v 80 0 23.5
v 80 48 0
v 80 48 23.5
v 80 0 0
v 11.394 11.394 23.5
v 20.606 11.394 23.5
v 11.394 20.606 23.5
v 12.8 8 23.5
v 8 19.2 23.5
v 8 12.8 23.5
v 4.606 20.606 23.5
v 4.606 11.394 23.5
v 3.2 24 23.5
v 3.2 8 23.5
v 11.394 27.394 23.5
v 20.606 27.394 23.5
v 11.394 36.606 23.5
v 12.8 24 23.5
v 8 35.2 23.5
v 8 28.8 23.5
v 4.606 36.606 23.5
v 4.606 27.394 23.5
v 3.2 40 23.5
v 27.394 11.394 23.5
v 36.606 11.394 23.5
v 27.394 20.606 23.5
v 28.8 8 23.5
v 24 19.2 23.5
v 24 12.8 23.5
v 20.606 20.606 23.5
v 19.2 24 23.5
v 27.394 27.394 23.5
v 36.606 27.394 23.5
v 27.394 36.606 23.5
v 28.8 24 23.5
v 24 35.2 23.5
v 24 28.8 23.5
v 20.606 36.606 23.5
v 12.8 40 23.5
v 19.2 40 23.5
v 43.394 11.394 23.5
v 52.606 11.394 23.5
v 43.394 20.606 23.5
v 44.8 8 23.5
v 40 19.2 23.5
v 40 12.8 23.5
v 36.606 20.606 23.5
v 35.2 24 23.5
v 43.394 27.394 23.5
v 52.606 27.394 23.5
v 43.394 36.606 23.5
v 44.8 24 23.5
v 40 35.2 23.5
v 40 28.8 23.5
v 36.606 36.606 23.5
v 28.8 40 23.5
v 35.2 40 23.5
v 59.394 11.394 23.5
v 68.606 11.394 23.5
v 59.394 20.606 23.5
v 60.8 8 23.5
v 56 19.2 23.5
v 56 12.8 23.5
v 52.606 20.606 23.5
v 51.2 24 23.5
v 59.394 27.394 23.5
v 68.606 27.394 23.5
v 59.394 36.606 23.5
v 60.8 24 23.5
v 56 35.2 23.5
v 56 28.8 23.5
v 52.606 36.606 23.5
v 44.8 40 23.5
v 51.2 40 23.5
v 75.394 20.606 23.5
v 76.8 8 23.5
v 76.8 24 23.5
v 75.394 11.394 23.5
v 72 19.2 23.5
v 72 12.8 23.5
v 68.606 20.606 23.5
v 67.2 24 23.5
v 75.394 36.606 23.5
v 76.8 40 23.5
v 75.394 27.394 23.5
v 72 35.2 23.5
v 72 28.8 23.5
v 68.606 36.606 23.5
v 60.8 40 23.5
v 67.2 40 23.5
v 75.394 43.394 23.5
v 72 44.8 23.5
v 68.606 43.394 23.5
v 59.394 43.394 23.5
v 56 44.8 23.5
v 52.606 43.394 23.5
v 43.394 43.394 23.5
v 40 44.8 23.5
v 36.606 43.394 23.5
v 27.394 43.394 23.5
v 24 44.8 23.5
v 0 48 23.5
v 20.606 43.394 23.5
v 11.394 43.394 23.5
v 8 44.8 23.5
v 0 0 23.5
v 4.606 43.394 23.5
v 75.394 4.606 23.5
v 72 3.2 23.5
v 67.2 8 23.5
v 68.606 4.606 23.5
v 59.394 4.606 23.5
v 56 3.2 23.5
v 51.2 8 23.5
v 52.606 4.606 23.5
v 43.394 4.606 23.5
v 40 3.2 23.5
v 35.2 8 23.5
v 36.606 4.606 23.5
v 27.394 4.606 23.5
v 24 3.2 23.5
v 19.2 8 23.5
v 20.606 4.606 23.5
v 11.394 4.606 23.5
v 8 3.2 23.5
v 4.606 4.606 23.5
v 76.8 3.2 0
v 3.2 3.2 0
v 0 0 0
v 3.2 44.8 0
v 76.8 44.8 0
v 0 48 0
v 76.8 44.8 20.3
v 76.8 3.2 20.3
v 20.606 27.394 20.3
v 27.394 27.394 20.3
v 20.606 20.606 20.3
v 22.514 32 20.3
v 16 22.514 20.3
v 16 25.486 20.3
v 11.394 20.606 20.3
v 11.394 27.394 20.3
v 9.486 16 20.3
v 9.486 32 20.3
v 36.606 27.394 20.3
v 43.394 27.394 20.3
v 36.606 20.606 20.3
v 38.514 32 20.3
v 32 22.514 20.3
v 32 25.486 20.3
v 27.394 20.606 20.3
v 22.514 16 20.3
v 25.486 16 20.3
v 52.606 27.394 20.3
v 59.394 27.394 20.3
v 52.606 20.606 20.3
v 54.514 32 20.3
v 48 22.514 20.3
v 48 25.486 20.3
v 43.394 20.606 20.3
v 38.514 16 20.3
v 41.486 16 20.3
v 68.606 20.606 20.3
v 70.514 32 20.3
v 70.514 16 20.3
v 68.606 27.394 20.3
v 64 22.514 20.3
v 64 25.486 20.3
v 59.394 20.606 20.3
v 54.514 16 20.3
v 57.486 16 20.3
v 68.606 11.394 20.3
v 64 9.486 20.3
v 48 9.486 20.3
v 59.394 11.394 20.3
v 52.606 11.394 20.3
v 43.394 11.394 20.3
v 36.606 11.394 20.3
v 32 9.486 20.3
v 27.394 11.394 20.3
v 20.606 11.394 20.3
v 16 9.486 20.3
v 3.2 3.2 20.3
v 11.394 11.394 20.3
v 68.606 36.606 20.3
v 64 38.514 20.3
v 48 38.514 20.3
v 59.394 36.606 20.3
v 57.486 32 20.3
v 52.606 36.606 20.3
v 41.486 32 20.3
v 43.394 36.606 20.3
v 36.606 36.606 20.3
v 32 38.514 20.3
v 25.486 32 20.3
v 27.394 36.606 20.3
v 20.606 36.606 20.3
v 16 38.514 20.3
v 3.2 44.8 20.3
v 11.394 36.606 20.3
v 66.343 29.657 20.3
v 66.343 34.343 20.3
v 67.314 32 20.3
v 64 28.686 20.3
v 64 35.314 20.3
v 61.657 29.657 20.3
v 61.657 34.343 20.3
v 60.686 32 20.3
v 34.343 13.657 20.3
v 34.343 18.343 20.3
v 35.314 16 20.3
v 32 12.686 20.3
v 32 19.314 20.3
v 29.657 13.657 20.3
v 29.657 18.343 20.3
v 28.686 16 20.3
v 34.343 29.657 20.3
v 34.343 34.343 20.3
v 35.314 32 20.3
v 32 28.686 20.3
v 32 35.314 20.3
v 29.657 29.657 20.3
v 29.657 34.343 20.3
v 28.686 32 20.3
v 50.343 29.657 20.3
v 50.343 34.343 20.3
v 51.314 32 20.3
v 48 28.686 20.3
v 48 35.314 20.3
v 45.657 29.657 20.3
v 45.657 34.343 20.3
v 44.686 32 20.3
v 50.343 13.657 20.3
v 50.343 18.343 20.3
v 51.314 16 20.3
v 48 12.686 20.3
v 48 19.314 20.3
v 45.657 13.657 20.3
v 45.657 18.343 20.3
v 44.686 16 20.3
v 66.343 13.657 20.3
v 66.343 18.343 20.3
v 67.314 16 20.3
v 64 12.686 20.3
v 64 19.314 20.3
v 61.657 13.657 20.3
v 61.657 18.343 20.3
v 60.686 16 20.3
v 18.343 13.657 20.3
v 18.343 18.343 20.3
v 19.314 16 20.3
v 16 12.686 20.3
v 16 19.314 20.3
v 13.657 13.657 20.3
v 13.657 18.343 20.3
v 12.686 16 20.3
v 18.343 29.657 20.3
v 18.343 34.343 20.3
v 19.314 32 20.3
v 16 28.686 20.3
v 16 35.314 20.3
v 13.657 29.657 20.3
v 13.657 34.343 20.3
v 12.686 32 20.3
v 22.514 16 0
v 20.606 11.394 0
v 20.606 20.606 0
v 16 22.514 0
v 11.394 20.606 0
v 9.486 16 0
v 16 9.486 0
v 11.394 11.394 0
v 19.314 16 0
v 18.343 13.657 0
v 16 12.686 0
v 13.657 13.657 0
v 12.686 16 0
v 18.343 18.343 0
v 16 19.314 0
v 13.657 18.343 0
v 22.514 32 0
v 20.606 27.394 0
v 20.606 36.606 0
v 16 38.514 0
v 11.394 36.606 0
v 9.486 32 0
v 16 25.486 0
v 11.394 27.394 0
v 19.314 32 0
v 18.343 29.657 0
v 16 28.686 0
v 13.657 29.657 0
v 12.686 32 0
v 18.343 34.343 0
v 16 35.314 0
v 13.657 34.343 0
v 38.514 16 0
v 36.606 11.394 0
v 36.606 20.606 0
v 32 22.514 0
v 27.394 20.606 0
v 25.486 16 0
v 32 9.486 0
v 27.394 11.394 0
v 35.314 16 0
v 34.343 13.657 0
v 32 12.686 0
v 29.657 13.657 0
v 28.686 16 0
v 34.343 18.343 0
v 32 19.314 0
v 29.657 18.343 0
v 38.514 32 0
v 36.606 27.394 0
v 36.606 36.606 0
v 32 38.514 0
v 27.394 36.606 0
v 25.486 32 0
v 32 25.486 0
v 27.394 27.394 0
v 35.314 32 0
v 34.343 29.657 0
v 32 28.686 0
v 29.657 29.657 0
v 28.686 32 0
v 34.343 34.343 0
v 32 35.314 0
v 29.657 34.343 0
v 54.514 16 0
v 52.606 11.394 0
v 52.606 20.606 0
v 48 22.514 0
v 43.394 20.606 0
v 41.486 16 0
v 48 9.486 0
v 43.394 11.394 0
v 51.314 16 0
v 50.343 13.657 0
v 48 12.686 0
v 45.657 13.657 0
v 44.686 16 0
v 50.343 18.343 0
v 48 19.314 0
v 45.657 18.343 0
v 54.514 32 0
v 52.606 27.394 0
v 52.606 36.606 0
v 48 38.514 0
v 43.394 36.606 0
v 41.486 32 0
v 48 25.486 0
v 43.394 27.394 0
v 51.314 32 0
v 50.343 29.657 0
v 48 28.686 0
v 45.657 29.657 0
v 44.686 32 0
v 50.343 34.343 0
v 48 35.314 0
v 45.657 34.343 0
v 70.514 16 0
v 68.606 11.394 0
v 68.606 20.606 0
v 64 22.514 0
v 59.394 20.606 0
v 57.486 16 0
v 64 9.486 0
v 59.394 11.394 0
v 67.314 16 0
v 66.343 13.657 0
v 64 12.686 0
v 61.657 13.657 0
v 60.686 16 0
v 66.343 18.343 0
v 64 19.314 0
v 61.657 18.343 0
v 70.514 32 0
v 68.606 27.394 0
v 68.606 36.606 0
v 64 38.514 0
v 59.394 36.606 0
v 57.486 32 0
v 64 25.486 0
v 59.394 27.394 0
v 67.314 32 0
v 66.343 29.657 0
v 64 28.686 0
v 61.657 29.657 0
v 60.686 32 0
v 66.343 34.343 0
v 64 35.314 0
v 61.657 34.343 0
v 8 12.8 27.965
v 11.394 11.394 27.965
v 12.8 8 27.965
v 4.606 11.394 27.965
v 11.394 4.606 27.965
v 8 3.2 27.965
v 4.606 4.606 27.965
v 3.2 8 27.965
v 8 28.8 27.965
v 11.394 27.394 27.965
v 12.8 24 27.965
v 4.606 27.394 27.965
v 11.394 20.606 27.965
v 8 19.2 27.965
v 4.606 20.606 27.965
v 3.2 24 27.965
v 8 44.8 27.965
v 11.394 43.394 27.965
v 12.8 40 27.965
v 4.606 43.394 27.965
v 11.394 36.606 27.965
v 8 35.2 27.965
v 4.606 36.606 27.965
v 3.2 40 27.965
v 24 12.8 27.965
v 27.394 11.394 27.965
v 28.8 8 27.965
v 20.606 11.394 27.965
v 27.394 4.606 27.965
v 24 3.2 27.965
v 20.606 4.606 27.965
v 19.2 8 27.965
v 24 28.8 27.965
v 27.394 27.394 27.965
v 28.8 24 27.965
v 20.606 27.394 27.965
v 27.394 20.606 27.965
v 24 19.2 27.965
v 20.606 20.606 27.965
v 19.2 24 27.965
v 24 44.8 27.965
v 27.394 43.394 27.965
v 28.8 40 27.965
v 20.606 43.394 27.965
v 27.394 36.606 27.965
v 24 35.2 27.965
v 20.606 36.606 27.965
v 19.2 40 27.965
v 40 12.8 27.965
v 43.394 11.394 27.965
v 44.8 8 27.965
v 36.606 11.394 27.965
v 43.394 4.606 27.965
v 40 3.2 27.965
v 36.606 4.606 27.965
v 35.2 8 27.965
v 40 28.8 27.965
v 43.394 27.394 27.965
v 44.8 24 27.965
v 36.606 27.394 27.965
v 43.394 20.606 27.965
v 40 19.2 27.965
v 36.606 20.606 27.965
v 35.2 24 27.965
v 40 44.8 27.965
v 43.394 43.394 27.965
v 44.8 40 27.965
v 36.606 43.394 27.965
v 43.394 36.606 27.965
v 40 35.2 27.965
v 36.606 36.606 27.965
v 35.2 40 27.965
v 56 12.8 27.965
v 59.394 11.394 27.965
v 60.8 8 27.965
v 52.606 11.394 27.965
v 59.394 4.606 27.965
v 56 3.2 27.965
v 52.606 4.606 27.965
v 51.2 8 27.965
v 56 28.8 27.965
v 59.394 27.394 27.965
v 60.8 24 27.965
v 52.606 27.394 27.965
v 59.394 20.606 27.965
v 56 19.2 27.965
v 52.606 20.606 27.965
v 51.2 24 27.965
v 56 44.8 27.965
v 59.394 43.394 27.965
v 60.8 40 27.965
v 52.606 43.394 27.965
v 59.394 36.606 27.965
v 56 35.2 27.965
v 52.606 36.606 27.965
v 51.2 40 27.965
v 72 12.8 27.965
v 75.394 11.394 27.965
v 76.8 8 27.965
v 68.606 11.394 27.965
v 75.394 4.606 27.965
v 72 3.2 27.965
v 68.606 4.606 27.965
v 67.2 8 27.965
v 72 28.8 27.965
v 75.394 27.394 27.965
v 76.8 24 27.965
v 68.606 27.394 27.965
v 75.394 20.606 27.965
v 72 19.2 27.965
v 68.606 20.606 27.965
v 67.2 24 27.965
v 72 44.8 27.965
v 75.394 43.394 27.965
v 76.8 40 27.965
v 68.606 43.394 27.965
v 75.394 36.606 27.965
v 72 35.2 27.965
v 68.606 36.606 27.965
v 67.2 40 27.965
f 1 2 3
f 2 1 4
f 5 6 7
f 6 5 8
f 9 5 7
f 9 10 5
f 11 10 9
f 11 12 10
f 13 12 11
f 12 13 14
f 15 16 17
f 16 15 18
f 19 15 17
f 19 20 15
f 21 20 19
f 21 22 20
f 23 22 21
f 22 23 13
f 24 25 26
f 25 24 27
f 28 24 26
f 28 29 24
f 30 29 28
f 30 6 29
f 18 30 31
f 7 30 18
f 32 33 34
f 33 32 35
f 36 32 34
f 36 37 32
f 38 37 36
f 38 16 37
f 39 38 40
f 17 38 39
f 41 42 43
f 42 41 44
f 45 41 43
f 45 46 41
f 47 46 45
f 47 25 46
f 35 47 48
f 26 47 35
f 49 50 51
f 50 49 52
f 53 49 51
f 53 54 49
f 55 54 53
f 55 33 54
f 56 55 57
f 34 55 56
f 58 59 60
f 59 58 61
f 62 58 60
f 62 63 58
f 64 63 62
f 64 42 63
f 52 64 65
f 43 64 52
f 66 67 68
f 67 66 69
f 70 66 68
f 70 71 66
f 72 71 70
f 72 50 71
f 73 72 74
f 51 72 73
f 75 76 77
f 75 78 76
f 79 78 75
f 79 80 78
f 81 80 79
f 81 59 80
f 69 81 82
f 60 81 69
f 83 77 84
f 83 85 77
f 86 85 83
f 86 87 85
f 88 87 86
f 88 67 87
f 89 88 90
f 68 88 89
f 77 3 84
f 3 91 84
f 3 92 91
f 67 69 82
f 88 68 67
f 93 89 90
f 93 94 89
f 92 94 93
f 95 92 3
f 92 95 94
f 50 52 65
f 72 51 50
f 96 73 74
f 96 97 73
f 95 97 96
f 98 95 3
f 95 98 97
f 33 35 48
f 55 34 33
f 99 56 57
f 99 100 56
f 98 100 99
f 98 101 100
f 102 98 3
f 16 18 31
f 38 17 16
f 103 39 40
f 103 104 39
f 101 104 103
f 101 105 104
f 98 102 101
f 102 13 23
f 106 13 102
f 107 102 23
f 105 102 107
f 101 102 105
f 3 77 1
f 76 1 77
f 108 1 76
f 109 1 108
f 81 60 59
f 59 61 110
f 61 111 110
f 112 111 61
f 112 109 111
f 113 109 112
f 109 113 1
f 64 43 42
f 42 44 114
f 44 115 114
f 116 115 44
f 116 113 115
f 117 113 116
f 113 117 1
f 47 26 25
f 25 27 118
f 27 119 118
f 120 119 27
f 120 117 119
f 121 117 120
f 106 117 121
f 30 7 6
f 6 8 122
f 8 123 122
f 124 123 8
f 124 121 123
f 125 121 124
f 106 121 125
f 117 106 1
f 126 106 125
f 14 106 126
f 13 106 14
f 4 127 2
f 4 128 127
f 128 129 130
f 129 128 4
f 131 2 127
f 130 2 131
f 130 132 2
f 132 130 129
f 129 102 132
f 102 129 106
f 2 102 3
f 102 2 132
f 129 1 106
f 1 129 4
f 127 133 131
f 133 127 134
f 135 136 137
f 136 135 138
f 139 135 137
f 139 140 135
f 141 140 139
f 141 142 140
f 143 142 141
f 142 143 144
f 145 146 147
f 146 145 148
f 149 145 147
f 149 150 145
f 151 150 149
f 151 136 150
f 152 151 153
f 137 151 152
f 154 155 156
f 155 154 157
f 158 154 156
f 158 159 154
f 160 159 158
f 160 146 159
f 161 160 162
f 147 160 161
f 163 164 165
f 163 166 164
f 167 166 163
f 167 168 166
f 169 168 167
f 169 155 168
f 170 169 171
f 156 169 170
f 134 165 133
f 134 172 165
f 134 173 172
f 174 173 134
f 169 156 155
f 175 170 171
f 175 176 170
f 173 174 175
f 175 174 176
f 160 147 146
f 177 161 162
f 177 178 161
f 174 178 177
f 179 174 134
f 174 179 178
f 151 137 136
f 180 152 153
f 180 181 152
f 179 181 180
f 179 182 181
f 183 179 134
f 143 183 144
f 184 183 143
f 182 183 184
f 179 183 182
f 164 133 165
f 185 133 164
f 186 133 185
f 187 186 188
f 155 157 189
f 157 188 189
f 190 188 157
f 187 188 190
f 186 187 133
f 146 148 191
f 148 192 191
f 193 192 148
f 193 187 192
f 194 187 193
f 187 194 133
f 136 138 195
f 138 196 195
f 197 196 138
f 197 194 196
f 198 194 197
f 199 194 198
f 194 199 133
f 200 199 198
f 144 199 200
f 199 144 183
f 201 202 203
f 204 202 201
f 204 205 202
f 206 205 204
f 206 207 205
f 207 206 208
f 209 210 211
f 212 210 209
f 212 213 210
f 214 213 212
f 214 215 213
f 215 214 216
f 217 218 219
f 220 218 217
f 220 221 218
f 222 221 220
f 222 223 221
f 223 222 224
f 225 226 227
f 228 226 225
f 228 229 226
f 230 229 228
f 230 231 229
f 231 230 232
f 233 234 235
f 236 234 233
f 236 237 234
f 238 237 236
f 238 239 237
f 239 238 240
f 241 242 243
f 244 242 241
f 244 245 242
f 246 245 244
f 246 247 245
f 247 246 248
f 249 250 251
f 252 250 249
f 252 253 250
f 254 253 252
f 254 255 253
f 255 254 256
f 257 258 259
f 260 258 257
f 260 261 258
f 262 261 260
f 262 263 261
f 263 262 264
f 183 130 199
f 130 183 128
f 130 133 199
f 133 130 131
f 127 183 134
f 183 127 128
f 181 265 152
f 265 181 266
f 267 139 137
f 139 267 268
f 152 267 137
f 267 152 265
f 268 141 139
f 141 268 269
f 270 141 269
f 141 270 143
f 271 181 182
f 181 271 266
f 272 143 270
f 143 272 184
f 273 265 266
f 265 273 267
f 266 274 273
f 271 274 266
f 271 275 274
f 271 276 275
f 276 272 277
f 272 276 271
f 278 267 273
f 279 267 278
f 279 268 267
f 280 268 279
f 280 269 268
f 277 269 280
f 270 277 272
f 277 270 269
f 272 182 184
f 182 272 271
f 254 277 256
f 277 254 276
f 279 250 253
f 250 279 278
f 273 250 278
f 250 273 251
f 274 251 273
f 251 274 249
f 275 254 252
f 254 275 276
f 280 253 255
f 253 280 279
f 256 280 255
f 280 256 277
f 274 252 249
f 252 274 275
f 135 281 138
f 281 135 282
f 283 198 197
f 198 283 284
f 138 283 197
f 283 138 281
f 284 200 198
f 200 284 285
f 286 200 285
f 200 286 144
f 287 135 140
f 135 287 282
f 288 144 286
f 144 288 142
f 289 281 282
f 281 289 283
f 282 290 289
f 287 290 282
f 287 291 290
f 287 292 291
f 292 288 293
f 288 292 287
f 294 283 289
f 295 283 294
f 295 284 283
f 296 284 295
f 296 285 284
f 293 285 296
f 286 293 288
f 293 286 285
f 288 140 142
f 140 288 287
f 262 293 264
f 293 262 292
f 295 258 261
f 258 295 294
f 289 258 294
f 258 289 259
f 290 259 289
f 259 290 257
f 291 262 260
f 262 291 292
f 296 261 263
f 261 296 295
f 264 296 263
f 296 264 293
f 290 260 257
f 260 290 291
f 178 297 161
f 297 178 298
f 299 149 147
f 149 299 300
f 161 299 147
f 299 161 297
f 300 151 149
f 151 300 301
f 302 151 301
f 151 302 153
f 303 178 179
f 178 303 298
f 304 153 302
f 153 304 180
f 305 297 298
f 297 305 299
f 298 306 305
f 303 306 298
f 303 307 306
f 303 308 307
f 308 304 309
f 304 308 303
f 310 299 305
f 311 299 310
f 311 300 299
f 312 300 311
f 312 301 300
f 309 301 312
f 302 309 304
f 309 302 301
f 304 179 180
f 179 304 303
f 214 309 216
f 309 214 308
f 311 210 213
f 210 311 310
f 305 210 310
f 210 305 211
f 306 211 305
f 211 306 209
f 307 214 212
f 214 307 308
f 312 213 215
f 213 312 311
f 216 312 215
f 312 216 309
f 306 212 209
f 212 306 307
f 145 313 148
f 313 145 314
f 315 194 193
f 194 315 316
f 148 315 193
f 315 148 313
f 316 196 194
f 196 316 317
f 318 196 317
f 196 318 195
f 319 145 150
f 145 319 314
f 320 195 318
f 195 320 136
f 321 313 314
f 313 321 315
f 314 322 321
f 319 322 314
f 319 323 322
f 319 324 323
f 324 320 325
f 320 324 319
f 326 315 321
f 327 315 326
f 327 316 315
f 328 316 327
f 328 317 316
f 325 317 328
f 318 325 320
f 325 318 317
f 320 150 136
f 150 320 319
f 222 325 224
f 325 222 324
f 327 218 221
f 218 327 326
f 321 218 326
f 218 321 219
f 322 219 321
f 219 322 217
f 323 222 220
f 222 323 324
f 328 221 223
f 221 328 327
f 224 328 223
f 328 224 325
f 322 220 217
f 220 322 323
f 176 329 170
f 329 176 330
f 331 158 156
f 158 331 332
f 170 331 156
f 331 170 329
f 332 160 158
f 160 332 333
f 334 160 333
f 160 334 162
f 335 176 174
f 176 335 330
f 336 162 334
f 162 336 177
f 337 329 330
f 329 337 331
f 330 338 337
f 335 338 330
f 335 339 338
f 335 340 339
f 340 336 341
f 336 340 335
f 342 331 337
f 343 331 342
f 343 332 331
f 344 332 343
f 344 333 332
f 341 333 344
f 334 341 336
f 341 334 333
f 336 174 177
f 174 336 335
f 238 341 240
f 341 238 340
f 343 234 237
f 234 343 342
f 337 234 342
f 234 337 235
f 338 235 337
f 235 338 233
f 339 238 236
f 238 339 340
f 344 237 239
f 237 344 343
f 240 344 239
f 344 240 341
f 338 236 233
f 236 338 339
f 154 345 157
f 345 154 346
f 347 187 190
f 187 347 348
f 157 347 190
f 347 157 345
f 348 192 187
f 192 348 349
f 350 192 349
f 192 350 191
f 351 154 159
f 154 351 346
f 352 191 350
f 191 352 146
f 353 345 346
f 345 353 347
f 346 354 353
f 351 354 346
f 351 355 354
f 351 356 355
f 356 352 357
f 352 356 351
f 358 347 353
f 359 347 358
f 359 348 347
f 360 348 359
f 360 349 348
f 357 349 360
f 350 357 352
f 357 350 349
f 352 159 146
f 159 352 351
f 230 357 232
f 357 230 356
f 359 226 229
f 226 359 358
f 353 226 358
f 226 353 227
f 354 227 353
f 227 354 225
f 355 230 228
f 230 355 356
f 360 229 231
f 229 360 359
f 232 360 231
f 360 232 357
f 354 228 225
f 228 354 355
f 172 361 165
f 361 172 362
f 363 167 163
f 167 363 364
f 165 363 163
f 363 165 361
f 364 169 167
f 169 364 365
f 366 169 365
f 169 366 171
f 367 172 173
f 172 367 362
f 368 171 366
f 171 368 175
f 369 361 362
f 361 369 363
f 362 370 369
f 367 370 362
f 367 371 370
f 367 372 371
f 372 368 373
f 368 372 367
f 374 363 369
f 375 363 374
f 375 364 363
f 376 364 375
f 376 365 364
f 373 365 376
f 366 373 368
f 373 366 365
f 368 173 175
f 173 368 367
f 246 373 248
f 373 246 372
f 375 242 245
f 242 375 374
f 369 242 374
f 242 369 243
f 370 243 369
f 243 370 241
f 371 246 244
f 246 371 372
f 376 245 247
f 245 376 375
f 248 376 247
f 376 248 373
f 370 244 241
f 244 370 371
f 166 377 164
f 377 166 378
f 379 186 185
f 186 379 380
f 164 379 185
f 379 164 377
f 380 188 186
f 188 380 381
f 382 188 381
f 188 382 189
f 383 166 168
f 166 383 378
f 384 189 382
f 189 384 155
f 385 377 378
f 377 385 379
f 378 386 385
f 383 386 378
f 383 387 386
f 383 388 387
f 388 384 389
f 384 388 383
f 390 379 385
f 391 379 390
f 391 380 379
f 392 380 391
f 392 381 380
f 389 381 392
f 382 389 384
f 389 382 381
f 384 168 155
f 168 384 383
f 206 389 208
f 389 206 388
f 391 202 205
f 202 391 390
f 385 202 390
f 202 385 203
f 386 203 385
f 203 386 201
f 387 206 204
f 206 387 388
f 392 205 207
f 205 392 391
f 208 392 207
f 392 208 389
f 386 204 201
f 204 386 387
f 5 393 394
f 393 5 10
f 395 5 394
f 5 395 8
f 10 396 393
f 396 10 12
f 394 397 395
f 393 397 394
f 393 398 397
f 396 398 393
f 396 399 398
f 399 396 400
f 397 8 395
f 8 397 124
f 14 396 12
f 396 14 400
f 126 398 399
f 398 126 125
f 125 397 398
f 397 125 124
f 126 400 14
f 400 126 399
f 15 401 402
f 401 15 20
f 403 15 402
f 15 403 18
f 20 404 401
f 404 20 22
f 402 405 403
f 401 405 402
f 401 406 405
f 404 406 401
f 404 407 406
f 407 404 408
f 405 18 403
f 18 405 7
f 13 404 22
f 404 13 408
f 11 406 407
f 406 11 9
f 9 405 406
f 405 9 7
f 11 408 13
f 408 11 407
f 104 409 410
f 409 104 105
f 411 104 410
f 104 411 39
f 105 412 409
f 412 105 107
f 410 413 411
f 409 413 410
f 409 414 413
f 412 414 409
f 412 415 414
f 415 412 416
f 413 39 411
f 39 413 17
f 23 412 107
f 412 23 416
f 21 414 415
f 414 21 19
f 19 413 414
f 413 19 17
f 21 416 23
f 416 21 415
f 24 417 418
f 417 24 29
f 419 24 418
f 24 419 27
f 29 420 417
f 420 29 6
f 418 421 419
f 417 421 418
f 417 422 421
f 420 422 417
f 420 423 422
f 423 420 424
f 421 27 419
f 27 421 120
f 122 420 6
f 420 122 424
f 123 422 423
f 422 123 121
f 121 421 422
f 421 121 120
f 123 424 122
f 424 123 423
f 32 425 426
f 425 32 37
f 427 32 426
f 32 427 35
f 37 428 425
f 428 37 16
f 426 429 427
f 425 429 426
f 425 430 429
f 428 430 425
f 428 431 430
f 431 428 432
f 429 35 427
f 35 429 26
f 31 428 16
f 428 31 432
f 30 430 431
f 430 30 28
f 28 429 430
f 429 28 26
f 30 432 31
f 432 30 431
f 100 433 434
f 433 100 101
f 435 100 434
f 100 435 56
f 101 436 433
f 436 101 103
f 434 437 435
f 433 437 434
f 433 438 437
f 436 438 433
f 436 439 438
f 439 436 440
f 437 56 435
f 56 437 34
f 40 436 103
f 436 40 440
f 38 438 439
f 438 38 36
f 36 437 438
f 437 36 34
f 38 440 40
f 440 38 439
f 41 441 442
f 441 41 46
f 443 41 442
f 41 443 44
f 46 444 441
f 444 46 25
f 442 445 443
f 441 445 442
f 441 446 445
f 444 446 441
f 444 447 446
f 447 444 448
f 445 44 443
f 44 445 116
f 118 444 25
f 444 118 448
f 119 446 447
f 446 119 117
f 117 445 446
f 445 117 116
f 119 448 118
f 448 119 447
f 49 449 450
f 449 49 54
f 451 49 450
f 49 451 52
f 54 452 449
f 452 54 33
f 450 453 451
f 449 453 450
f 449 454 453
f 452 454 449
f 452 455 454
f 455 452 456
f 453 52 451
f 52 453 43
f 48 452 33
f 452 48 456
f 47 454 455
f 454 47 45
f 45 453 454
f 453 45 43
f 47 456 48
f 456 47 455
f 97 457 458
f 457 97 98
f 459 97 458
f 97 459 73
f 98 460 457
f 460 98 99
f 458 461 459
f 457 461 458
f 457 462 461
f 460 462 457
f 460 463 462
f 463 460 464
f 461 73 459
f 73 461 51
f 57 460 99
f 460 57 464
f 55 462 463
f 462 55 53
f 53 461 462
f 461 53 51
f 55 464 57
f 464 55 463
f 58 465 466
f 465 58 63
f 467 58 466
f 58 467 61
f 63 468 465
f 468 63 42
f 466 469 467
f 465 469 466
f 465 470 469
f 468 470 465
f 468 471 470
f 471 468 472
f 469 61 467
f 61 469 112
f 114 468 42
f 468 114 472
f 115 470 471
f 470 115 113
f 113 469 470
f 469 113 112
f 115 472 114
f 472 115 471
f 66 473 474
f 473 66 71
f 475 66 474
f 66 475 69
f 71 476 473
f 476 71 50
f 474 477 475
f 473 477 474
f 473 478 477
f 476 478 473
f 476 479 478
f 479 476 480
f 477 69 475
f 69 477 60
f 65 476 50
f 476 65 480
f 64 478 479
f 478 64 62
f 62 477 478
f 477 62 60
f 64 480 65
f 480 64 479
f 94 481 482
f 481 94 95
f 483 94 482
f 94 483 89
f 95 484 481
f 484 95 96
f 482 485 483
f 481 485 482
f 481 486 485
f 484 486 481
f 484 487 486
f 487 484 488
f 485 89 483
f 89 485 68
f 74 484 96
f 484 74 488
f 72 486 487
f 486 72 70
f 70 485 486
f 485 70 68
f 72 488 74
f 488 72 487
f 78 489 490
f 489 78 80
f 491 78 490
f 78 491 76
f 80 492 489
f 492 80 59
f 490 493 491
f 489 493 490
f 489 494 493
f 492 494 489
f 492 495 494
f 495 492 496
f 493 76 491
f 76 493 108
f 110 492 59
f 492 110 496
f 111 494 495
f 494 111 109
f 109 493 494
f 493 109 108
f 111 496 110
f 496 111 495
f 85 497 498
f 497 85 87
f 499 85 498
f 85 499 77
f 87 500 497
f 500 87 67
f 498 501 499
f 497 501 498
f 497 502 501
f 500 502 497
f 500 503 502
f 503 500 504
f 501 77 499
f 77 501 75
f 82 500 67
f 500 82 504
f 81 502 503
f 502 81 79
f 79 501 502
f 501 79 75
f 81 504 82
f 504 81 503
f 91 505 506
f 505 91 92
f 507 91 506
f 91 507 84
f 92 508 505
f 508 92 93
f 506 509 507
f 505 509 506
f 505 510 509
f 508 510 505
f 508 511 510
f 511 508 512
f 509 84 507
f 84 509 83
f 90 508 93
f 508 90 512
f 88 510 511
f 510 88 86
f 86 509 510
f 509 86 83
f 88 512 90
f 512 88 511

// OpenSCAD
// file: toybrick-dimensions.scad
// Dimension of 1x1 piece (without stud)
// These are for typical toddler size bricks (in mm).
// You can change these for different brick systems.
height = 23.5;
length = 16;

// Connector studs (as ratio of brick)
stud_height = height * 0.19;
stud_diameter = length * 0.6;

// Derived values
wall_thickness = (length - stud_diameter) / 2;
diagonal = length * sqrt(2);
tube_diameter = diagonal - stud_diameter;
// file: toybrick.scad
include <toybrick-dimensions.scad>;

// Main toybrick() module. See README and examples.

module toybrick(units_wide, units_long) {

	// Step 1: Make the body (main hollow brick)
	body(units_wide, units_long);

	// Step 2: Now loop over x,y...
	for (x=[0 : units_wide - 1], y=[0 : units_long - 1]) {

		// Top stud
		stud(x, y);

		// If beyond the first column and row, inner tube
		if (x > 0 && y > 0) {
			tube(x, y);
		}

	}

	// That's it!
}

module body(units_wide, units_long) {
	difference() {
		cube([
				units_wide * length,
				units_long * length,
				height]);
		translate([wall_thickness, wall_thickness, 0]) {
			cube([
					units_wide * length - wall_thickness * 2,
					units_long * length - wall_thickness * 2,
					height - wall_thickness]);
		}
	}
}

module stud(unit_x, unit_y) {
	translate([
			(unit_x + 0.5) * length,
			(unit_y + 0.5) * length,
			height]) {
		cylinder(d=stud_diameter, h=stud_height);
	}
}

module tube(unit_x, unit_y) {
	translate([
			unit_x * length,
			unit_y * length,
			0]) {
		difference() {
			cylinder(d=tube_diameter, h=height - wall_thickness);
			cylinder(d=tube_diameter - wall_thickness * 2, h=height - wall_thickness);
		}
	}
}
// main file
include <toybrick.scad>;


// Make a brick. Change parameters for different brick length/width.
toybrick(5, 3);


/// This is a magic OpenSCAD variables that determines how
// many faces a circular object should consist of.
// Increasing the number will make a nice smooth circle
// (e.g. 60), but it will be slow to render. Reducing to
// 8 will look a bit janky but render super quick.
$fn = 8;
